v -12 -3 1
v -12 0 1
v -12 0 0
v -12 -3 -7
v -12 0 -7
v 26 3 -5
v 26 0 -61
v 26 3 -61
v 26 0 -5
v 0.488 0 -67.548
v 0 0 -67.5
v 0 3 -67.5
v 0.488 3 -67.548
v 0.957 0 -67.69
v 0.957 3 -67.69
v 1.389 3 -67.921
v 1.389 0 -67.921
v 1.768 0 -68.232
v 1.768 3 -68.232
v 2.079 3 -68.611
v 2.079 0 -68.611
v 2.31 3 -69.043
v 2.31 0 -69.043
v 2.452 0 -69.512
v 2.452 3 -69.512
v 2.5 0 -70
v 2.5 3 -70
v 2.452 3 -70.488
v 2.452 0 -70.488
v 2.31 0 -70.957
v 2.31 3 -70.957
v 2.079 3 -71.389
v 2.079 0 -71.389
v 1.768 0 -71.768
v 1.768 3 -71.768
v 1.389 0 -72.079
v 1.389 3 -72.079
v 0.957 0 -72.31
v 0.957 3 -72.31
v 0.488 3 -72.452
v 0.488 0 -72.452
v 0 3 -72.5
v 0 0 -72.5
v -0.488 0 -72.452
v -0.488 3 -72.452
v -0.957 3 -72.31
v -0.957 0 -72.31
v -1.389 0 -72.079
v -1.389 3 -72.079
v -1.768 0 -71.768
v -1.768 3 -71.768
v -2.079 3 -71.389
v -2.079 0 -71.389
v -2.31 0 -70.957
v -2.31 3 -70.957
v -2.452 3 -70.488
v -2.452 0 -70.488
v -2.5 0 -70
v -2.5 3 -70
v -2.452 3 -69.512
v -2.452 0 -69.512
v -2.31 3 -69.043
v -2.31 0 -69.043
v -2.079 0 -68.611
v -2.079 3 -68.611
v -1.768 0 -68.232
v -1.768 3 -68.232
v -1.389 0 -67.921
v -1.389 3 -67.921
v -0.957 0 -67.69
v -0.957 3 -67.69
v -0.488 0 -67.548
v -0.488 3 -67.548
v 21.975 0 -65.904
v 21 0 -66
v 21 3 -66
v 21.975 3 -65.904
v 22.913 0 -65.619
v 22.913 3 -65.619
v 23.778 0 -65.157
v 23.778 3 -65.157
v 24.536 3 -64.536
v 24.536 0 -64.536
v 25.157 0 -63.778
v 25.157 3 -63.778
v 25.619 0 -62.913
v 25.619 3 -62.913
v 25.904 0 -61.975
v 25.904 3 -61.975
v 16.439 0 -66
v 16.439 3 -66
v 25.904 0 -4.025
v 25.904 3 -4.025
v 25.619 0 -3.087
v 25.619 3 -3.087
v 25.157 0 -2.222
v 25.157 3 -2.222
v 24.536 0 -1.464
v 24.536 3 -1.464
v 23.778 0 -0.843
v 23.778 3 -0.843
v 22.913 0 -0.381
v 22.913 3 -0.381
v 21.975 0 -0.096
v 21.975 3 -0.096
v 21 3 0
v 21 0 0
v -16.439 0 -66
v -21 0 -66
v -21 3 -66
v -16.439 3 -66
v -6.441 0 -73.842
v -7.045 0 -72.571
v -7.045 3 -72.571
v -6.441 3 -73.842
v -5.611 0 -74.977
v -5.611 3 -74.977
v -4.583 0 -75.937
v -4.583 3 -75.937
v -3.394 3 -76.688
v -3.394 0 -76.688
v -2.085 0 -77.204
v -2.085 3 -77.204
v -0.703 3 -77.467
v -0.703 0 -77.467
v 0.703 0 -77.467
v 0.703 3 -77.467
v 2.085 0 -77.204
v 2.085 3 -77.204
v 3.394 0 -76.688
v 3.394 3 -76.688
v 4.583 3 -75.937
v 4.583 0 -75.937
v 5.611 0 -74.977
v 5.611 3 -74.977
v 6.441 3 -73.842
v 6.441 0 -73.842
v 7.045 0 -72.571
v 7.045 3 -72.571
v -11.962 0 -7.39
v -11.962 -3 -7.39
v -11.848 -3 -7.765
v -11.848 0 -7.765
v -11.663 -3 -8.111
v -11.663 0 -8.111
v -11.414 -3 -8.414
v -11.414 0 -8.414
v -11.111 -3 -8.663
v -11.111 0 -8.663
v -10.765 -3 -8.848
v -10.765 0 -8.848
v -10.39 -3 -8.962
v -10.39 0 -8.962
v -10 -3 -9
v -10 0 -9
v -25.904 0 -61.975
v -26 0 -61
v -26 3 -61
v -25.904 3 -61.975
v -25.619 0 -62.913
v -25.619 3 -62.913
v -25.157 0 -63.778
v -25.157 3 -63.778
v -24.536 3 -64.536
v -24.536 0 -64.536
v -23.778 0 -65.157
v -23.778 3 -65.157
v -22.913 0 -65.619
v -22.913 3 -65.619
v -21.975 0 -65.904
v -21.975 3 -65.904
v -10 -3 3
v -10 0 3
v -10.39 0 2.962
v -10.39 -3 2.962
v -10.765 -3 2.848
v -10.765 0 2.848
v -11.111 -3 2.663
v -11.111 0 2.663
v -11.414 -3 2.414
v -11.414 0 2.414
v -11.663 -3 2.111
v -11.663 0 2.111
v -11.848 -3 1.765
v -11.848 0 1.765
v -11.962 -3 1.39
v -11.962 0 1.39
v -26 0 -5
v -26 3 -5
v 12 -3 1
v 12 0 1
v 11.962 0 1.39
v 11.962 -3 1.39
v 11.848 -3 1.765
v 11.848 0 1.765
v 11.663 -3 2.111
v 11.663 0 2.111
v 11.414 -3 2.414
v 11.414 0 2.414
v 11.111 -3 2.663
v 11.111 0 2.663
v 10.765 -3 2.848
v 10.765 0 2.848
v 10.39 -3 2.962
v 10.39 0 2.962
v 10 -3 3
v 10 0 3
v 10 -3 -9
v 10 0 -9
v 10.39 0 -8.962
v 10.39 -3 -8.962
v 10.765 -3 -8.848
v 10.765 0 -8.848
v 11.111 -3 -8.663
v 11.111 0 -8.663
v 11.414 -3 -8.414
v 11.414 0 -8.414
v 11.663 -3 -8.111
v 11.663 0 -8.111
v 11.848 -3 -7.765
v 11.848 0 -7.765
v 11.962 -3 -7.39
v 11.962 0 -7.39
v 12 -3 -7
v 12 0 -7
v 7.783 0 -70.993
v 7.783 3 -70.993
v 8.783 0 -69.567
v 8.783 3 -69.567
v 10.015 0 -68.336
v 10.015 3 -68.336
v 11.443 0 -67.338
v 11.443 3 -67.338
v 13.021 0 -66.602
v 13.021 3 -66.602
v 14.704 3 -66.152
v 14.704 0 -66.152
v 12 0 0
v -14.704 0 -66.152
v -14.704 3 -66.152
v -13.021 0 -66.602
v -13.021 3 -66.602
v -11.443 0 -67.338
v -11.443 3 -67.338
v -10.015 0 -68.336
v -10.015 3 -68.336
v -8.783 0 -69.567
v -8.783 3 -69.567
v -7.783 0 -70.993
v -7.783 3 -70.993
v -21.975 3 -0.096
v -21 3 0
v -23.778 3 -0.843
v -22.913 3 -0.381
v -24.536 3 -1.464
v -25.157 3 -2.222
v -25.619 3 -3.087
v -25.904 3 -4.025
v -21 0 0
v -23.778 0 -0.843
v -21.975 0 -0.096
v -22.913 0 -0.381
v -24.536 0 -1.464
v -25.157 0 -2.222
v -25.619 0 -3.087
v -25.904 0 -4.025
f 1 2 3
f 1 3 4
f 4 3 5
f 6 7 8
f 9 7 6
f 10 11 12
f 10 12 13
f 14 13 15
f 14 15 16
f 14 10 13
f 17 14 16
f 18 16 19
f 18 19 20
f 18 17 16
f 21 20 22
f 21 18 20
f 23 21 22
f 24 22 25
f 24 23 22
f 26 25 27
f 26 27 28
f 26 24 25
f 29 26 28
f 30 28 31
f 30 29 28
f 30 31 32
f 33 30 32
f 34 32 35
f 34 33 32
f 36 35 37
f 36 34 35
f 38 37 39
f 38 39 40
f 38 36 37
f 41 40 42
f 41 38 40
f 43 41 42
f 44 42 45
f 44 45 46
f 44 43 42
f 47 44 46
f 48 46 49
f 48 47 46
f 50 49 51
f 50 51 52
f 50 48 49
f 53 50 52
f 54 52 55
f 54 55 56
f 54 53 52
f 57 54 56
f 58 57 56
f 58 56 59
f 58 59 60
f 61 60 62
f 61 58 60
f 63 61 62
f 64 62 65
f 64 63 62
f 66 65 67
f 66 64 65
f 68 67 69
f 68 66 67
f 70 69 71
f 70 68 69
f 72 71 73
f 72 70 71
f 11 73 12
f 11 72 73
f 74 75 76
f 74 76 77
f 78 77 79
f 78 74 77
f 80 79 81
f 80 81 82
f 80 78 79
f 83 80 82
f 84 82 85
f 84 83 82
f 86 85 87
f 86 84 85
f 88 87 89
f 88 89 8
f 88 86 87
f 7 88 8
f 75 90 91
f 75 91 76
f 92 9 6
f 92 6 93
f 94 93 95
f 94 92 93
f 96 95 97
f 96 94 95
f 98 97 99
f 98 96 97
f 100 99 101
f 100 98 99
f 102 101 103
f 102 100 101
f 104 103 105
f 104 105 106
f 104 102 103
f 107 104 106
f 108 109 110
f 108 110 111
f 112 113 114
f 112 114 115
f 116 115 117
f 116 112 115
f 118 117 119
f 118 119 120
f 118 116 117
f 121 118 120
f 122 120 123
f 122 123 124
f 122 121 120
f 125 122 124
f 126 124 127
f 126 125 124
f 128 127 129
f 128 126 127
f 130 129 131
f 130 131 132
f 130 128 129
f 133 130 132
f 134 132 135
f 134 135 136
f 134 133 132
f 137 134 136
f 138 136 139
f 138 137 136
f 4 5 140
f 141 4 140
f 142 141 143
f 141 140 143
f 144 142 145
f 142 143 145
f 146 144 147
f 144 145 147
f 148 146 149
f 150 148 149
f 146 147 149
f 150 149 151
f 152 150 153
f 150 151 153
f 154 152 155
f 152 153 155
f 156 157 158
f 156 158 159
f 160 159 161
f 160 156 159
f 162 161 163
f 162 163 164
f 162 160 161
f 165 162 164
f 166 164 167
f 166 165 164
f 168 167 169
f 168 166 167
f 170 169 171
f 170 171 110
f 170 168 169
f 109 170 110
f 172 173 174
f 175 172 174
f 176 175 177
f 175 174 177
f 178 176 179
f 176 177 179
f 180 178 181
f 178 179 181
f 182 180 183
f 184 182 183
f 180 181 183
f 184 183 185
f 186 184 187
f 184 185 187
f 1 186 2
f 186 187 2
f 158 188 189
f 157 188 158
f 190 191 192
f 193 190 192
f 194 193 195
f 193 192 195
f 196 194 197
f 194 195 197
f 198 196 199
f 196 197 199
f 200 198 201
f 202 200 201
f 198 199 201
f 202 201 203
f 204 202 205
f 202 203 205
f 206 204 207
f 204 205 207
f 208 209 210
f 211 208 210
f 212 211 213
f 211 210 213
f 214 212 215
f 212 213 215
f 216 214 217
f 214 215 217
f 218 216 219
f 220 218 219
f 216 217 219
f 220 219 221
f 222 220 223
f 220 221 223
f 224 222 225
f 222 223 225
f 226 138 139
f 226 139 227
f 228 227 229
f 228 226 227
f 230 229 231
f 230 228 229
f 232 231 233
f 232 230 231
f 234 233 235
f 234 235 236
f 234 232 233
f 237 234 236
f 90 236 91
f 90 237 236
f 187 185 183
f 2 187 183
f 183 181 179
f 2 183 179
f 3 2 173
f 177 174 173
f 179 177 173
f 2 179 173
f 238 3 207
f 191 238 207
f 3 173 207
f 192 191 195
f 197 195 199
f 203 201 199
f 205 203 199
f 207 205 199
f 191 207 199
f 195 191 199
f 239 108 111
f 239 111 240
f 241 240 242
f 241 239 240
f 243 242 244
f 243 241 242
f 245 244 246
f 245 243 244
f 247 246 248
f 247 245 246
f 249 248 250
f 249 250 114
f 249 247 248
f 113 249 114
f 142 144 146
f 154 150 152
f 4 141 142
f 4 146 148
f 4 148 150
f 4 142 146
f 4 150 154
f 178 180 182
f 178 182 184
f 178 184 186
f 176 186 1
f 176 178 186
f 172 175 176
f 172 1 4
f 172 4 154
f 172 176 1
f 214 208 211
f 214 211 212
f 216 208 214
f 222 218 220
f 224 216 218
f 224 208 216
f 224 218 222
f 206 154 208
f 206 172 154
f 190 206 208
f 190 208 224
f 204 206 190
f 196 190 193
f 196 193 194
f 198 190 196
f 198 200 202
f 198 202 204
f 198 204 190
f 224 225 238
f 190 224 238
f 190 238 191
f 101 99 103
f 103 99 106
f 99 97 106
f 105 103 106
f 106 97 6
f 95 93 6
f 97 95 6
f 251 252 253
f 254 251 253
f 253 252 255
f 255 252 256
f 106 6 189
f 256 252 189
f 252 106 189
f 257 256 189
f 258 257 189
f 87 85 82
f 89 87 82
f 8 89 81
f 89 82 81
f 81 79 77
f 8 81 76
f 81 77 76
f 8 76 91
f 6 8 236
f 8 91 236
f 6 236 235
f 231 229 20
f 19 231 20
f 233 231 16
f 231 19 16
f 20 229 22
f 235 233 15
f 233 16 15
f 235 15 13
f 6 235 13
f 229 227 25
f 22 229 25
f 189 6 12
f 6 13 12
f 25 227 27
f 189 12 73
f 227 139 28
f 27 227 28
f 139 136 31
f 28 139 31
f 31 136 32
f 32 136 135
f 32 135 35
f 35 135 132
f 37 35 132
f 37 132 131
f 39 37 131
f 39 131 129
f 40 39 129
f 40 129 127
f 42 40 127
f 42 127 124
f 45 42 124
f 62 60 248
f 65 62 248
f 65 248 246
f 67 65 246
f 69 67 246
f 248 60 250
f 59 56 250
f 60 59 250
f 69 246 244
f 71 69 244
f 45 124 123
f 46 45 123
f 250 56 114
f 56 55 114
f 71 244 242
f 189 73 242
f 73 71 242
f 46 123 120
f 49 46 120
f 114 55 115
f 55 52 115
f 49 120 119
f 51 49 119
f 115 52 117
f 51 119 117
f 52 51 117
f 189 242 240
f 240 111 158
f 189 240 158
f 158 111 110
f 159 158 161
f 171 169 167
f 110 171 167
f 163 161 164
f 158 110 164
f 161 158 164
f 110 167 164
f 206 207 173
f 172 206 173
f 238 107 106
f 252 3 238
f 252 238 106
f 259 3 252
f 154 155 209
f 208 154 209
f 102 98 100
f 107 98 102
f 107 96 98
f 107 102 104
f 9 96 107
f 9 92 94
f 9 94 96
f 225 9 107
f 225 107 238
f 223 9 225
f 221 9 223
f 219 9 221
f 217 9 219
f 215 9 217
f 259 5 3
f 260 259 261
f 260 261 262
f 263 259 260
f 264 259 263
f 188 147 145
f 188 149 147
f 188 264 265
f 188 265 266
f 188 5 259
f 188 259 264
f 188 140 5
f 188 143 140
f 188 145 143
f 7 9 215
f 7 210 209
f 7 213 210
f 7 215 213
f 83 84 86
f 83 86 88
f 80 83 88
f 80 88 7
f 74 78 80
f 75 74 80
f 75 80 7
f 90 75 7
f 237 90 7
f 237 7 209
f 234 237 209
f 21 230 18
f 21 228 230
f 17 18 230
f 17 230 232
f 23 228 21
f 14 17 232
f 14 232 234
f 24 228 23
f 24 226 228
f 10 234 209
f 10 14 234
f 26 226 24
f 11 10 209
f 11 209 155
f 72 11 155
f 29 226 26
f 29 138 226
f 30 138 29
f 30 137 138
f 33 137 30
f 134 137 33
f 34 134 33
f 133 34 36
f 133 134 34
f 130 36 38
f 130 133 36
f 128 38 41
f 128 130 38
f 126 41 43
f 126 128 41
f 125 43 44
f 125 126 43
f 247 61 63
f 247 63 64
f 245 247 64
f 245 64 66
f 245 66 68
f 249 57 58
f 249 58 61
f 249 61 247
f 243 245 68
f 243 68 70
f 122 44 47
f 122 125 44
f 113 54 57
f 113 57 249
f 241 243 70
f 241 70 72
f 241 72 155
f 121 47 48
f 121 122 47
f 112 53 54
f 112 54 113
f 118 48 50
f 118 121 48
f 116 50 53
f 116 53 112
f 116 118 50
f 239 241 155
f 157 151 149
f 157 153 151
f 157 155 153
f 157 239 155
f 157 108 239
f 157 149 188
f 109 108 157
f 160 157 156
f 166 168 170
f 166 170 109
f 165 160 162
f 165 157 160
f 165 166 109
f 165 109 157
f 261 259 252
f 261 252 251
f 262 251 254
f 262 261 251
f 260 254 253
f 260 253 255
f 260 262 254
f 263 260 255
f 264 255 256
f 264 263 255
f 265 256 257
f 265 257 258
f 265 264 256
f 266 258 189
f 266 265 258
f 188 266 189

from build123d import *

# Parameters (mm, degrees)
SKETCH1_R           = 2.5
BOSS_EXTRUDE1_DEPTH = 3
BOSS_EXTRUDE2_DEPTH = 3


with BuildPart() as part:
    # Sketch1 → Boss-Extrude1 (new body)
    with BuildSketch(Plane(origin=(0, 0, 0), x_dir=(1, 0, 0), z_dir=(0, 1, 0))):
        with BuildLine():
            Line((-21, 66), (-16.439282223, 66))
            ThreePointArc((-16.439282223, 66), (-10.707167181, 67.805925486), (-7.045406667, 72.571428571))
            ThreePointArc((-7.045406667, 72.571428571), (0, 77.5), (7.045406667, 72.571428571))
            ThreePointArc((7.045406667, 72.571428571), (10.707167181, 67.805925486), (16.439282223, 66))
            Line((16.439282223, 66), (21, 66))
            ThreePointArc((21, 66), (24.535533906, 64.535533906), (26, 61))
            Line((26, 61), (26, 5))
            ThreePointArc((26, 5), (24.535533906, 1.464466094), (21, 0))
            Line((21, 0), (-21, 0))
            ThreePointArc((-21, 0), (-24.535533906, 1.464466094), (-26, 5))
            Line((-26, 5), (-26, 61))
            ThreePointArc((-26, 61), (-24.535533906, 64.535533906), (-21, 66))
        make_face()
        with Locations(Location((0, 70, 0), (0, 0, 270))):
            Circle(SKETCH1_R, mode=Mode.SUBTRACT)
    extrude(amount=BOSS_EXTRUDE1_DEPTH)

    # Sketch2 → Boss-Extrude2 (add)
    with BuildSketch(Plane.XZ):
        with BuildLine():
            Line((-10, -9), (10, -9))
            ThreePointArc((10, -9), (11.414213562, -8.414213562), (12, -7))
            Line((12, -7), (12, 1))
            ThreePointArc((12, 1), (11.414213562, 2.414213562), (10, 3))
            Line((10, 3), (-10, 3))
            ThreePointArc((-10, 3), (-11.414213562, 2.414213562), (-12, 1))
            Line((-12, 1), (-12, -7))
            ThreePointArc((-12, -7), (-11.414213562, -8.414213562), (-10, -9))
        make_face()
    extrude(amount=BOSS_EXTRUDE2_DEPTH)


solid = part.part
